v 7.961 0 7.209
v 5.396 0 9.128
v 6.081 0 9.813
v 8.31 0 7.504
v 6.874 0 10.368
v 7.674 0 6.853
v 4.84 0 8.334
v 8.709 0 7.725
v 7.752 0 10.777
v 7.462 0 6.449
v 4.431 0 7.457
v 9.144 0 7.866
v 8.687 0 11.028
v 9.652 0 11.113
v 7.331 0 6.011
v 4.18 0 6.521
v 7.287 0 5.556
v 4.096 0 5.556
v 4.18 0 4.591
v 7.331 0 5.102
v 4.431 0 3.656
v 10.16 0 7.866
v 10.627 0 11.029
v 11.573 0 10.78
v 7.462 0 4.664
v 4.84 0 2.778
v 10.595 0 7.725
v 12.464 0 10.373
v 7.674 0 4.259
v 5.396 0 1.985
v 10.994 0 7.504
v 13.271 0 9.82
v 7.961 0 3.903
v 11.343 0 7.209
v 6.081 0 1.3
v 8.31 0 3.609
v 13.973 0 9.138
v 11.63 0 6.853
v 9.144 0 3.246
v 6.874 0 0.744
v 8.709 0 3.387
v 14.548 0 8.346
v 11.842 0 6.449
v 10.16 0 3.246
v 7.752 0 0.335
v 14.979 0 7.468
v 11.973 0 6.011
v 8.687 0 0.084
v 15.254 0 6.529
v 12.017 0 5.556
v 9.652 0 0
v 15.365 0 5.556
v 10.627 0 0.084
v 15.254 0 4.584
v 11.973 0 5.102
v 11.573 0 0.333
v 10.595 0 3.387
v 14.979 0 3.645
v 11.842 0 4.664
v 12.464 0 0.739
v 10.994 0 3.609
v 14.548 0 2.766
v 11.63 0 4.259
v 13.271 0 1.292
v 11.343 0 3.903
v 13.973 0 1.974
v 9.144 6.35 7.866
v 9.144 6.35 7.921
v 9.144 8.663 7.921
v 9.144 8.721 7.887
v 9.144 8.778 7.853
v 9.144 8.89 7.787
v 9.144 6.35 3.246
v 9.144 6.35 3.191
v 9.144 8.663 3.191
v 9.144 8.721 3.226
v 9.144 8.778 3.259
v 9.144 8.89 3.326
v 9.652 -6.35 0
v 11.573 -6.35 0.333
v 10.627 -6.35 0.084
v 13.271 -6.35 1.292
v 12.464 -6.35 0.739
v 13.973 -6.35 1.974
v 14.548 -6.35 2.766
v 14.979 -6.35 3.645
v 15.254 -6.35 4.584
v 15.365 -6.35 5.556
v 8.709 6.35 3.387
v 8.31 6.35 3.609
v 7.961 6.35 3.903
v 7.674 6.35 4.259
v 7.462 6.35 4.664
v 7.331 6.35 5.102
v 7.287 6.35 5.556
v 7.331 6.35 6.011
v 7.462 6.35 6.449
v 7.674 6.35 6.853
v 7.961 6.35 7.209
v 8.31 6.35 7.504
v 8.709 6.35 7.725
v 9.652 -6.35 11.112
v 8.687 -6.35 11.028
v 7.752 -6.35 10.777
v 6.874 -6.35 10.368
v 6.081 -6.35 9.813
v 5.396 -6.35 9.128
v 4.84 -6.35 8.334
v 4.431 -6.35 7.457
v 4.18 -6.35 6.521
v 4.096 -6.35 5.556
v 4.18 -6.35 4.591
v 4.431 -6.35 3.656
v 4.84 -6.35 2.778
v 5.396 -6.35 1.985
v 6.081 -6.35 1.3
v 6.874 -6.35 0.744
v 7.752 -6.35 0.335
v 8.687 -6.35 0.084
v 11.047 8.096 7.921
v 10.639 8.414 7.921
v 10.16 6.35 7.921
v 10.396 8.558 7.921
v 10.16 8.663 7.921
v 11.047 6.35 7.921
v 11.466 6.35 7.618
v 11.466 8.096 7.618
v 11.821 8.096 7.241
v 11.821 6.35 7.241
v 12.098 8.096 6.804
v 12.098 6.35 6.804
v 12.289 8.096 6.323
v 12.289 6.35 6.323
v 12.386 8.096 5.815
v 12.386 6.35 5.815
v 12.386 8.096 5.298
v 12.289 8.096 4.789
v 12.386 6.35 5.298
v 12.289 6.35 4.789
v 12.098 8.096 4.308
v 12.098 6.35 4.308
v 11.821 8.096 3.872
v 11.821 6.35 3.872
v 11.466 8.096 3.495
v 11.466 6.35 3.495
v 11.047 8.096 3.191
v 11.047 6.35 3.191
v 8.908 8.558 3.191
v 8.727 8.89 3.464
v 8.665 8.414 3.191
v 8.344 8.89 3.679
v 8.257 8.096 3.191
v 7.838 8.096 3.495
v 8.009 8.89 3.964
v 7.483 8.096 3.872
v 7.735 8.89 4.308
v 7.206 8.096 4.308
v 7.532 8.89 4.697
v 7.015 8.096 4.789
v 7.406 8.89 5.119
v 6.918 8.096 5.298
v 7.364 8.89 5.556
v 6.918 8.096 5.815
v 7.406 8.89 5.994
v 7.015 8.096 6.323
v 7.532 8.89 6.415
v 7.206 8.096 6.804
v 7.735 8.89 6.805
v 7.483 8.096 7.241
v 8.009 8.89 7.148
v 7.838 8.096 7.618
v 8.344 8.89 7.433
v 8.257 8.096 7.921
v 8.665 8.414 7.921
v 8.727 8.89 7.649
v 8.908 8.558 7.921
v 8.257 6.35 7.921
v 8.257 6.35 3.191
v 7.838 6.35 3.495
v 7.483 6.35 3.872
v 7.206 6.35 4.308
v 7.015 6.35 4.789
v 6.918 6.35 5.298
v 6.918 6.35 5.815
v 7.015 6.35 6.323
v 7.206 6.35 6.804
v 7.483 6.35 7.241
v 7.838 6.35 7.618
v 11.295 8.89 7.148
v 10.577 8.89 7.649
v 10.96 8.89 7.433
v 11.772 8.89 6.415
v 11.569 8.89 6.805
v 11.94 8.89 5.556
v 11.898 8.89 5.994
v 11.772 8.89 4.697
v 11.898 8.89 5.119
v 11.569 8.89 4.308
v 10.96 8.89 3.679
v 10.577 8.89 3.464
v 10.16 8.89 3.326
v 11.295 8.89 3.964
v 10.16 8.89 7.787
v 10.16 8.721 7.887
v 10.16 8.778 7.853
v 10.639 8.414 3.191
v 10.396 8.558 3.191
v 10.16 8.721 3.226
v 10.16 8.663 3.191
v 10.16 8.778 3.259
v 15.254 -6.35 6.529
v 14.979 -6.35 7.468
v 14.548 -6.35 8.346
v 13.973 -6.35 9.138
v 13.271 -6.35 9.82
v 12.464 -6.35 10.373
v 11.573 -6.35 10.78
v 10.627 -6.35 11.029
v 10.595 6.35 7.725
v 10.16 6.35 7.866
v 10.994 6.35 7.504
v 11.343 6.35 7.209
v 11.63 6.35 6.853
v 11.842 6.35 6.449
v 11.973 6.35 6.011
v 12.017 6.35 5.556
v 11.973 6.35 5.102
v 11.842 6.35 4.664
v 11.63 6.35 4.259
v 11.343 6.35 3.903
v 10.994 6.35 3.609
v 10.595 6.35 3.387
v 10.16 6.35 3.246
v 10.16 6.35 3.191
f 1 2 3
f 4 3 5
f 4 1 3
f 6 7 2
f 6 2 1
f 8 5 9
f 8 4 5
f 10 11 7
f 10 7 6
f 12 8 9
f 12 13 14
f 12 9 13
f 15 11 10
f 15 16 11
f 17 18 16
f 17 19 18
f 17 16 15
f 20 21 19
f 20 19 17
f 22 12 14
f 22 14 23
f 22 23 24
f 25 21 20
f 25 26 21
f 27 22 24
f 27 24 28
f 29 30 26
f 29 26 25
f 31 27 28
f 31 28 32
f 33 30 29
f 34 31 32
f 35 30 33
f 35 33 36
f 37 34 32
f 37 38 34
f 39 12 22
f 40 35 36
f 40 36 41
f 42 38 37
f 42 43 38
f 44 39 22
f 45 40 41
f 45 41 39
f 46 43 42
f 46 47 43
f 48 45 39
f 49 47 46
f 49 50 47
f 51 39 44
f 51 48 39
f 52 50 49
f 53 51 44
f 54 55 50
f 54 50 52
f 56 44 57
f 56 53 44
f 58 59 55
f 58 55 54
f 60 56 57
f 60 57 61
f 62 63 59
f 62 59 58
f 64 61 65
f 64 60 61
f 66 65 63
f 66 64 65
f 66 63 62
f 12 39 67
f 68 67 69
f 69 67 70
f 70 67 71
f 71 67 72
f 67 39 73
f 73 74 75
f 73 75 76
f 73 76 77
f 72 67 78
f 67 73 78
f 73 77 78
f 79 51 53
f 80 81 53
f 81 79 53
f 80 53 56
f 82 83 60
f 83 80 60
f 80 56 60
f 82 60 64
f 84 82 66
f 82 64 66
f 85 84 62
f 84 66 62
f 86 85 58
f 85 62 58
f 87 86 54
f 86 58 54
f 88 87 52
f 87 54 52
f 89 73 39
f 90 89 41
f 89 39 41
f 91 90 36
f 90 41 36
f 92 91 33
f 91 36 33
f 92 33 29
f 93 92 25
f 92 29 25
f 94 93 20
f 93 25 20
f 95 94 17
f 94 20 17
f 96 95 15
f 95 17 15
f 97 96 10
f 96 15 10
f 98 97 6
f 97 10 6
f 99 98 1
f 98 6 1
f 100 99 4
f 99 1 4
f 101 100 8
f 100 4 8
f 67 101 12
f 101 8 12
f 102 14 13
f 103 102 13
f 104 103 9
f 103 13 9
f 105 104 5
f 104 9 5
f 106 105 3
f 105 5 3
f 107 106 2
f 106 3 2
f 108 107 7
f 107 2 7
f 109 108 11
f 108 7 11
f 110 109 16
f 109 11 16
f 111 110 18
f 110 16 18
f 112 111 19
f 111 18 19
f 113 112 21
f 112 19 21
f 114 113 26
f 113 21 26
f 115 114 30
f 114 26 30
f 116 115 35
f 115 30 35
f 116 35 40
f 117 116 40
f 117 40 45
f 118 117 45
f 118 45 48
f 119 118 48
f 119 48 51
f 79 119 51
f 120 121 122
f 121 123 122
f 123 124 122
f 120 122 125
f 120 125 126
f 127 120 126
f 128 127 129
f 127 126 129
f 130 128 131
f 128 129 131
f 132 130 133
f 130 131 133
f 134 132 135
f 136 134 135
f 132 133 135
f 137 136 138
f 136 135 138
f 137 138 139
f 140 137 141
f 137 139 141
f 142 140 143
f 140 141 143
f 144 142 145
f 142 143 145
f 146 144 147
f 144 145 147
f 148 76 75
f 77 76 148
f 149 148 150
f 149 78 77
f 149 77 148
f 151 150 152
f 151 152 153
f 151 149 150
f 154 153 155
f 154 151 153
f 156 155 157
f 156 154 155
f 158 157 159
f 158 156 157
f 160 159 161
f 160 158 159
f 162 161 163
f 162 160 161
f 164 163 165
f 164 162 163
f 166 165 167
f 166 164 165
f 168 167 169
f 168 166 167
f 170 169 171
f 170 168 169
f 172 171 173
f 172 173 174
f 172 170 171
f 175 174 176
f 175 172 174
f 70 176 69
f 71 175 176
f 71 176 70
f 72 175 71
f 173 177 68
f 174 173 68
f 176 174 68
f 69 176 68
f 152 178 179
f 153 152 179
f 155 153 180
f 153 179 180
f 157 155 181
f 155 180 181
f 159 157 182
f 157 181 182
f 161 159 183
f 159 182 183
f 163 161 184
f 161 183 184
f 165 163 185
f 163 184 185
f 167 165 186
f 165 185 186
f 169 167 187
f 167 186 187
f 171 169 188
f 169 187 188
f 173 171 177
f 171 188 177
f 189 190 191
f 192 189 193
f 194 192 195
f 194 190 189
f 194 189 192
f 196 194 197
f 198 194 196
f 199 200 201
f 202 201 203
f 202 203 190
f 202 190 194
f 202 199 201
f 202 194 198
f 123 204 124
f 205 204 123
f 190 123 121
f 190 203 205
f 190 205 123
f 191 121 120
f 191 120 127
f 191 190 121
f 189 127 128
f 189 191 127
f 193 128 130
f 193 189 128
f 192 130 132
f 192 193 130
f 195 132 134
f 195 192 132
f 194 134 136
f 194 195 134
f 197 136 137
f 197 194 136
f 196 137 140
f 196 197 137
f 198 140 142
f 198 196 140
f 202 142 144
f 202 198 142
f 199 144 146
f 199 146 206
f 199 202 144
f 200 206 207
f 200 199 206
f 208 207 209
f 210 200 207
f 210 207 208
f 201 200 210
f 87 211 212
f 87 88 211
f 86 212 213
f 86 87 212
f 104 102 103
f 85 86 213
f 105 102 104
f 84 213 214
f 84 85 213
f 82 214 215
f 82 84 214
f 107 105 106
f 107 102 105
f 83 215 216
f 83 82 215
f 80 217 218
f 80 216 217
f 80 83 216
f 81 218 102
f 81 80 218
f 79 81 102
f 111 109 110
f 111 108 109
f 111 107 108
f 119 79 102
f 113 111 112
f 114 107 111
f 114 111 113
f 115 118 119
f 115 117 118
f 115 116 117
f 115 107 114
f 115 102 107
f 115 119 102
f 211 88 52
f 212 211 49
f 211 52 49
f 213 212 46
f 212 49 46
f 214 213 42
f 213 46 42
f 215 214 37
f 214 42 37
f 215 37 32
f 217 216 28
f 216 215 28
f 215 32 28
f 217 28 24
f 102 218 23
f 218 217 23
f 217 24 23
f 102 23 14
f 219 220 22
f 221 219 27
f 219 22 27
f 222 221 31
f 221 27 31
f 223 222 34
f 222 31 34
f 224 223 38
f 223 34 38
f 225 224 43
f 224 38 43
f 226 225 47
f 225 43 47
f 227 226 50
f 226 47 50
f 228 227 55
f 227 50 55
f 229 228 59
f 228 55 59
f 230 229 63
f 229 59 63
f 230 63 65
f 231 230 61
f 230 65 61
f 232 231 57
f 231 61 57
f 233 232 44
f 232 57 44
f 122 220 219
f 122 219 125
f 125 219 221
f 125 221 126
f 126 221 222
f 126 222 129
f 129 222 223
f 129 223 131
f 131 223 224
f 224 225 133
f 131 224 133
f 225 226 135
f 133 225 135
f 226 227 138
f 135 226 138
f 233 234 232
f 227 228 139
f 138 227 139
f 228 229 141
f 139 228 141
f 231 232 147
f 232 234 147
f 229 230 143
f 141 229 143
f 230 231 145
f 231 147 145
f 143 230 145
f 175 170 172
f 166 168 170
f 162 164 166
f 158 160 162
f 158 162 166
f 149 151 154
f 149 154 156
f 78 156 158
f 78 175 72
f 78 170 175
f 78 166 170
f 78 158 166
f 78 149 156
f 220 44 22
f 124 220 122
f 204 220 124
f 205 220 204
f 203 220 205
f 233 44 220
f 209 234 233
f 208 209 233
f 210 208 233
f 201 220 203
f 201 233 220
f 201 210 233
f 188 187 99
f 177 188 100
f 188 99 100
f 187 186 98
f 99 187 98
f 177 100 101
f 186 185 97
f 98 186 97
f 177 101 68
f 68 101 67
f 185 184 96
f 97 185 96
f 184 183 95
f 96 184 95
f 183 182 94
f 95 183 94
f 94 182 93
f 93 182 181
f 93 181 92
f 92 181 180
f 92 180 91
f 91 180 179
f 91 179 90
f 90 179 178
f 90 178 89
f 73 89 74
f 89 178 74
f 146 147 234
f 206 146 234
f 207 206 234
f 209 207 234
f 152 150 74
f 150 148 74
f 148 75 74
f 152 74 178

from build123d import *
from OCP.BRepFilletAPI import BRepFilletAPI_MakeChamfer

# Parameters (mm, degrees)
BOSS_EXTRUDE1_DEPTH = 11.1125
FILLET1_R           = 6.35
FILLET2_R           = 5.715
SKETCH2_R           = 2.365
BOSS_EXTRUDE2_DEPTH = 6.35
BOSS_EXTRUDE3_DEPTH = 2.54
SKETCH4_W           = 1.016
SKETCH4_H           = 8.89
CUT_EXTRUDE2_DEPTH  = 21.94269975
CHAMFER1_SIZE       = 0.79375
CHAMFER1_SIZE2      = 0.458271776
CUT_EXTRUDE3_DEPTH  = 21.94269975


# Some blends are built 0.0001 mm under size
with BuildPart() as part:
    # Sketch1 → Boss-Extrude1 (new body)
    with BuildSketch(Plane.XY):
        with BuildLine():
            Line((3.302, 0), (15.367, 0))
            Line((15.367, 0), (15.367, -6.35))
            Line((15.367, -6.35), (-6.477, -6.35))
            Line((-6.477, -6.35), (-6.477, 0))
            Line((-6.477, 0), (-3.302, 0))
            ThreePointArc((-3.302, 0), (0, -3.302), (3.302, 0))
        make_face()
    extrude(amount=BOSS_EXTRUDE1_DEPTH)

    # Fillet1
    fillet1_edges = [part.edges().sort_by_distance(p)[0] for p in [
        (-6.477, -6.35, 5.55625),
    ]]
    fillet(fillet1_edges, radius=FILLET1_R - 0.0001)  # a hair under: the kernel refuses the full size

    # Fillet2
    # the kernel refuses this fillet: 5.715 mm, written as the material it takes off along each edge
    with BuildSketch(Plane(origin=(15.367, 14.2875, 0), x_dir=(-1, 0, 0), z_dir=(0, -1, 0)), Plane(origin=(15.367, 14.2875, 11.1125), x_dir=(0, 0, -1), z_dir=(0, -1, 0))) as fillet2_piece_1:
        with BuildLine():
            CenterArc((FILLET2_R, -FILLET2_R), FILLET2_R, 90, 90)
            Line((0, -FILLET2_R), (0, 0))
            Line((0, 0), (FILLET2_R, 0))
        make_face()
    extrude(amount=34.925, mode=Mode.SUBTRACT)

    # Sketch2 → Boss-Extrude2 (add)
    with BuildSketch(Plane(origin=(0, 0, 0), x_dir=(1, 0, 0), z_dir=(0, 1, 0))):
        with Locations(Location((9.652, -5.55625, 0), (0, 0, 270))):
            Circle(SKETCH2_R)
    extrude(amount=BOSS_EXTRUDE2_DEPTH)

    # Sketch3 → Boss-Extrude3 (add)
    with BuildSketch(Plane(origin=(0, 6.35, 0), x_dir=(1, 0, 0), z_dir=(0, 1, 0))):
        with BuildLine():
            Line((8.25654631, -7.92125), (11.04745369, -7.92125))
            ThreePointArc((11.04745369, -7.92125), (12.398, -5.55625), (11.04745369, -3.19125))
            Line((11.04745369, -3.19125), (8.25654631, -3.19125))
            ThreePointArc((8.25654631, -3.19125), (6.906, -5.55625), (8.25654631, -7.92125))
        make_face()
    extrude(amount=BOSS_EXTRUDE3_DEPTH)

    # Sketch4 → Cut-Extrude2 (cut, through all)
    with BuildSketch(Plane.XY):
        with Locations((9.652, 4.445)):
            Rectangle(SKETCH4_W, SKETCH4_H)
    extrude(amount=CUT_EXTRUDE2_DEPTH, mode=Mode.SUBTRACT)

    # Chamfer1: one chamfer whose edges measure the first distance from different faces: ONE call of the kernel's chamfer builder (chamfer() names one face for all edges)
    chamfer1_edges_1 = [part.edges().sort_by_distance(p)[0] for p in [
        (6.906, 8.89, 5.55625),
    ]]
    chamfer1_side_1 = [part.faces().sort_by_distance(p)[0] for p in [
        (6.906, 7.62, 5.55625),
    ]]
    chamfer1_edges_2 = [part.edges().sort_by_distance(p)[0] for p in [
        (12.398, 8.89, 5.55625),
    ]]
    chamfer1_side_2 = [part.faces().sort_by_distance(p)[0] for p in [
        (12.398, 7.62, 5.55625),
    ]]
    chamfer1 = BRepFilletAPI_MakeChamfer(part.part.solid().wrapped)
    for e in chamfer1_edges_1:
        chamfer1.Add(CHAMFER1_SIZE, CHAMFER1_SIZE2, e.wrapped, chamfer1_side_1[0].wrapped)  # the first distance lies on this face
    for e in chamfer1_edges_2:
        chamfer1.Add(CHAMFER1_SIZE, CHAMFER1_SIZE2, e.wrapped, chamfer1_side_2[0].wrapped)  # the first distance lies on this face
    add(Compound.cast(chamfer1.Shape()), mode=Mode.REPLACE)

    # Sketch5 → Cut-Extrude3 (cut, through all)
    with BuildSketch(Plane(origin=(0, 0, 0), x_dir=(1, 0, 0), z_dir=(0, 1, 0))):
        with BuildLine():
            Line((9.652, 0), (-6.477, 0))
            Line((-6.477, 0), (-6.477, -11.1125))
            Line((-6.477, -11.1125), (9.652, -11.1125))
            ThreePointArc((9.652, -11.1125), (4.09575, -5.55625), (9.652, 0))
        make_face()
    extrude(amount=-CUT_EXTRUDE3_DEPTH, mode=Mode.SUBTRACT)


solid = part.part
